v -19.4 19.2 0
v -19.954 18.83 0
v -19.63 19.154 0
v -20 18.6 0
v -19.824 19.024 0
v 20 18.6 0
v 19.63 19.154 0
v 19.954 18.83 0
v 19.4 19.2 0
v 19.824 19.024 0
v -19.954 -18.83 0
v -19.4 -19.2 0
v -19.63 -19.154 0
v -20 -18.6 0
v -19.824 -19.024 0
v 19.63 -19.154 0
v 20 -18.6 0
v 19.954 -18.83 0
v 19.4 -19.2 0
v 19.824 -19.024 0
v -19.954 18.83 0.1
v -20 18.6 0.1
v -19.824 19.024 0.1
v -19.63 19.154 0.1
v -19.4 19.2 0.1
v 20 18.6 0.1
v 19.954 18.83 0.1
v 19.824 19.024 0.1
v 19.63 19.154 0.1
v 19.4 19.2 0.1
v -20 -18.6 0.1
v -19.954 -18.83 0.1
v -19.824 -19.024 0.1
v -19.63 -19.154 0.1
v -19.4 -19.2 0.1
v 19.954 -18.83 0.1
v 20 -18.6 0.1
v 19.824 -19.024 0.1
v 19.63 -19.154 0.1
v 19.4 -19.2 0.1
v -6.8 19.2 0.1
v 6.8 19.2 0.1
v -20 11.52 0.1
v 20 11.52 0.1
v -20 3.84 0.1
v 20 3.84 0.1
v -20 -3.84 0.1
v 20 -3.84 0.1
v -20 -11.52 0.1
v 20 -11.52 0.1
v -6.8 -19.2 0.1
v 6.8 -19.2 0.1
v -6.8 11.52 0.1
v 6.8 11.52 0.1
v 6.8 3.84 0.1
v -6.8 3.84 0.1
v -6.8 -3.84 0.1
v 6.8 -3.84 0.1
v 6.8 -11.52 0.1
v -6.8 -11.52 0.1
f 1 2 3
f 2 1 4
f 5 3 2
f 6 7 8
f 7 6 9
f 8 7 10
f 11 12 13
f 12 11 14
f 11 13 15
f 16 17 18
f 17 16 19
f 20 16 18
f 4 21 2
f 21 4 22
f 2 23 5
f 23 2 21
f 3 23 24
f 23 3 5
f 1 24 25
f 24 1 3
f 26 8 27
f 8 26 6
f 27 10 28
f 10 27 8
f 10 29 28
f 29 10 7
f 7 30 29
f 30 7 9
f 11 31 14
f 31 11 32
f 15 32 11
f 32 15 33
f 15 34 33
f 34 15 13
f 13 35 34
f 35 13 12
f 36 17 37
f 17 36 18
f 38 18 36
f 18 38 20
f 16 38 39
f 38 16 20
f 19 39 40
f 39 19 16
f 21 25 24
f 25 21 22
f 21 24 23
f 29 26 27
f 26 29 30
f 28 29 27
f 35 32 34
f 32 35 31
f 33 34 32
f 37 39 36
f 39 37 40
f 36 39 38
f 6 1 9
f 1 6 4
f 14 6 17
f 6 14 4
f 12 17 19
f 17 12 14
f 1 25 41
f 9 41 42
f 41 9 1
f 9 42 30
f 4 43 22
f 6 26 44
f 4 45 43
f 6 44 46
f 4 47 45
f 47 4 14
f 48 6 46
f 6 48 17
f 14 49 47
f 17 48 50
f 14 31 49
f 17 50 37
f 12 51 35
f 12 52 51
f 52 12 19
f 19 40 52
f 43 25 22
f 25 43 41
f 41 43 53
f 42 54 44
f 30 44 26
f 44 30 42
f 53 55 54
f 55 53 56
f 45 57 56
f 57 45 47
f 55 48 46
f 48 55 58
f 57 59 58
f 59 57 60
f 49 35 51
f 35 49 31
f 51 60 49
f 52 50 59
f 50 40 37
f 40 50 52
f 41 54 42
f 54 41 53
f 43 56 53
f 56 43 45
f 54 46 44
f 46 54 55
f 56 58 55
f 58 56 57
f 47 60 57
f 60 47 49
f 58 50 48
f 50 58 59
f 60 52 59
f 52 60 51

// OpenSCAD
// file: ../p/1-4cyli.scad
use <../lib.scad>
function ldraw_lib__1_4cyli() = [
// 0 Cylinder 0.25
// 0 Name: 1-4cyli.dat
// 0 Author: James Jessiman
// 0 !LDRAW_ORG Primitive UPDATE 2012-01
// 0 !LICENSE Licensed under CC BY 4.0 : see CAreadme.txt
// 
// 0 BFC CERTIFY CCW
  [0,"BFC","CERTIFY"],
  [0,"BFC","CCW"],
// 
// 0 !HISTORY 2002-03-23 [sbliss] Added BFC statement.
// 0 !HISTORY 2002-04-25 [PTadmin] Official Update 2002-02
// 0 !HISTORY 2007-06-22 [PTadmin] Header formatted for Contributor Agreement
// 0 !HISTORY 2008-07-01 [PTadmin] Official Update 2008-01
// 0 !HISTORY 2012-02-16 [Philo] Changed to CCW
// 0 !HISTORY 2012-03-30 [PTadmin] Official Update 2012-01
// 
// 
// 4 16 1 1 0 0.9239 1 0.3827 0.9239 0 0.3827 1 0 0
  [4,16,1,1,0,0.9239,1,0.3827,0.9239,0,0.3827,1,0,0],
// 5 24 1 0 0 1 1 0 0.9239 0 0.3827 1 0 -1
  [5,24,1,0,0,1,1,0,0.9239,0,0.3827,1,0,-1],
// 4 16 0.9239 1 0.3827 0.7071 1 0.7071 0.7071 0 0.7071 0.9239 0 0.3827
  [4,16,0.9239,1,0.3827,0.7071,1,0.7071,0.7071,0,0.7071,0.9239,0,0.3827],
// 5 24 0.9239 0 0.3827 0.9239 1 0.3827 0.7071 0 0.7071 1 0 0
  [5,24,0.9239,0,0.3827,0.9239,1,0.3827,0.7071,0,0.7071,1,0,0],
// 4 16 0.7071 1 0.7071 0.3827 1 0.9239 0.3827 0 0.9239 0.7071 0 0.7071
  [4,16,0.7071,1,0.7071,0.3827,1,0.9239,0.3827,0,0.9239,0.7071,0,0.7071],
// 5 24 0.7071 0 0.7071 0.7071 1 0.7071 0.3827 0 0.9239 0.9239 0 0.3827
  [5,24,0.7071,0,0.7071,0.7071,1,0.7071,0.3827,0,0.9239,0.9239,0,0.3827],
// 4 16 0.3827 1 0.9239 0 1 1 0 0 1 0.3827 0 0.9239
  [4,16,0.3827,1,0.9239,0,1,1,0,0,1,0.3827,0,0.9239],
// 5 24 0.3827 0 0.9239 0.3827 1 0.9239 0 0 1 0.7071 0 0.7071
  [5,24,0.3827,0,0.9239,0.3827,1,0.9239,0,0,1,0.7071,0,0.7071],
// 5 24 0 0 1 0 1 1 0.3827 0 0.9239 -1 0 1
  [5,24,0,0,1,0,1,1,0.3827,0,0.9239,-1,0,1],
];
module ldraw_lib__1_4cyli(step=0, col=false, unit=2/5, alt=false, line=0.2, solid=!$preview)
    makepoly(ldraw_lib__1_4cyli(), step=step, col=col, unit=unit, alt=alt, line=line, solid=solid);
ldraw_lib__1_4cyli(line=0.2);
// file: ../p/1-4chrd.scad
use <../lib.scad>
function ldraw_lib__1_4chrd() = [
// 0 Chord 0.25
// 0 Name: 1-4chrd.dat
// 0 Author: Tony Hafner [hafhead]
// 0 !LDRAW_ORG Primitive UPDATE 2012-02
// 0 !LICENSE Licensed under CC BY 2.0 and CC BY 4.0 : see CAreadme.txt
// 
// 0 BFC CERTIFY CCW
  [0,"BFC","CERTIFY"],
  [0,"BFC","CCW"],
// 
// 0 !HISTORY 2004-04-22 [PTadmin] Official Update 2004-02
// 0 !HISTORY 2007-10-09 [PTadmin] Header formatted for Contributor Agreement
// 0 !HISTORY 2008-07-01 [PTadmin] Official Update 2008-01
// 0 !HISTORY 2012-08-02 [MMR1988] Re-creation with PrimGen2 and Rectifier
// 0 !HISTORY 2012-08-09 [PTadmin] Official Update 2012-02
// 
// 
// 4 16 0.9239 0 0.3827 0.3827 0 0.9239 0 0 1 1 0 0
  [4,16,0.9239,0,0.3827,0.3827,0,0.9239,0,0,1,1,0,0],
// 3 16 0.7071 0 0.7071 0.3827 0 0.9239 0.9239 0 0.3827
  [3,16,0.7071,0,0.7071,0.3827,0,0.9239,0.9239,0,0.3827],
];
module ldraw_lib__1_4chrd(step=0, col=false, unit=2/5, alt=false, line=0.2, solid=!$preview)
    makepoly(ldraw_lib__1_4chrd(), step=step, col=col, unit=unit, alt=alt, line=line, solid=solid);
ldraw_lib__1_4chrd(line=0.2);
// main file
use <../lib.scad>
use <../p/1-4chrd.scad>
use <../p/1-4cyli.scad>
function ldraw_lib__6141875e() = [
// 0 Sticker  4.8 x  5.0 Chequered
// 0 Name: 6141875e.dat
// 0 Author: Massimo Maso [Sirio]
// 0 !LDRAW_ORG Part UPDATE 2022-06
// 0 !LICENSE Licensed under CC BY 4.0 : see CAreadme.txt
// 
// 0 BFC CERTIFY CCW
  [0,"BFC","CERTIFY"],
  [0,"BFC","CCW"],
// 
// 0 !KEYWORDS Bricklink 75875stk01, Brickowl 53567, Rebrickable 24760, Set 75875
// 0 !KEYWORDS Speed Champions
// 
// 0 !HISTORY 2022-12-20 [PTadmin] Official Update 2022-06
// 
// 
// 0 // Primitives
// 
// 1 16 -48.5 0 46.5 -1.5 0 0 0 -1 0 0 0 1.5 1-4chrd.dat
  [1,16,-48.5,0,46.5,-1.5,0,0,0,-1,0,0,0,1.5, ldraw_lib__1_4chrd()],
// 1 16 48.5 0 46.5 1.5 0 0 0 -1 0 0 0 1.5 1-4chrd.dat
  [1,16,48.5,0,46.5,1.5,0,0,0,-1,0,0,0,1.5, ldraw_lib__1_4chrd()],
// 1 16 -48.5 0 -46.5 -1.5 0 0 0 -1 0 0 0 -1.5 1-4chrd.dat
  [1,16,-48.5,0,-46.5,-1.5,0,0,0,-1,0,0,0,-1.5, ldraw_lib__1_4chrd()],
// 1 16 48.5 0 -46.5 1.5 0 0 0 -1 0 0 0 -1.5 1-4chrd.dat
  [1,16,48.5,0,-46.5,1.5,0,0,0,-1,0,0,0,-1.5, ldraw_lib__1_4chrd()],
// 1 16 -48.5 0 46.5 -1.5 0 0 0 -.25 0 0 0 1.5 1-4cyli.dat
  [1,16,-48.5,0,46.5,-1.5,0,0,0,-.25,0,0,0,1.5, ldraw_lib__1_4cyli()],
// 1 16 48.5 0 46.5 1.5 0 0 0 -.25 0 0 0 1.5 1-4cyli.dat
  [1,16,48.5,0,46.5,1.5,0,0,0,-.25,0,0,0,1.5, ldraw_lib__1_4cyli()],
// 1 16 -48.5 0 -46.5 -1.5 0 0 0 -.25 0 0 0 -1.5 1-4cyli.dat
  [1,16,-48.5,0,-46.5,-1.5,0,0,0,-.25,0,0,0,-1.5, ldraw_lib__1_4cyli()],
// 1 16 48.5 0 -46.5 1.5 0 0 0 -.25 0 0 0 -1.5 1-4cyli.dat
  [1,16,48.5,0,-46.5,1.5,0,0,0,-.25,0,0,0,-1.5, ldraw_lib__1_4cyli()],
// 1 0 -48.5 -.25 46.5 -1.5 0 0 0 1 0 0 0 1.5 1-4chrd.dat
  [1,0,-48.5,-.25,46.5,-1.5,0,0,0,1,0,0,0,1.5, ldraw_lib__1_4chrd()],
// 1 0 48.5 -.25 46.5 1.5 0 0 0 1 0 0 0 1.5 1-4chrd.dat
  [1,0,48.5,-.25,46.5,1.5,0,0,0,1,0,0,0,1.5, ldraw_lib__1_4chrd()],
// 1 0 -48.5 -.25 -46.5 -1.5 0 0 0 1 0 0 0 -1.5 1-4chrd.dat
  [1,0,-48.5,-.25,-46.5,-1.5,0,0,0,1,0,0,0,-1.5, ldraw_lib__1_4chrd()],
// 1 0 48.5 -.25 -46.5 1.5 0 0 0 1 0 0 0 -1.5 1-4chrd.dat
  [1,0,48.5,-.25,-46.5,1.5,0,0,0,1,0,0,0,-1.5, ldraw_lib__1_4chrd()],
// 0 // Bottom face
// 4 16 48.5 0 48 50 0 46.5 -50 0 46.5 -48.5 0 48
  [4,16,48.5,0,48,50,0,46.5,-50,0,46.5,-48.5,0,48],
// 4 16 50 0 46.5 50 0 -46.5 -50 0 -46.5 -50 0 46.5
  [4,16,50,0,46.5,50,0,-46.5,-50,0,-46.5,-50,0,46.5],
// 4 16 48.5 0 -48 -48.5 0 -48 -50 0 -46.5 50 0 -46.5
  [4,16,48.5,0,-48,-48.5,0,-48,-50,0,-46.5,50,0,-46.5],
// 0 // Lateral face
// 3 16 -48.5 0 48 -48.5 -.25 48 -17 -.25 48
  [3,16,-48.5,0,48,-48.5,-.25,48,-17,-.25,48],
// 4 16 -48.5 0 48 -17 -.25 48 17 -.25 48 48.5 0 48
  [4,16,-48.5,0,48,-17,-.25,48,17,-.25,48,48.5,0,48],
// 3 16 48.5 0 48 17 -.25 48 48.5 -.25 48
  [3,16,48.5,0,48,17,-.25,48,48.5,-.25,48],
// 3 16 -50 0 46.5 -50 -.25 28.8 -50 -.25 46.5
  [3,16,-50,0,46.5,-50,-.25,28.8,-50,-.25,46.5],
// 3 16 50 0 46.5 50 -.25 46.5 50 -.25 28.8
  [3,16,50,0,46.5,50,-.25,46.5,50,-.25,28.8],
// 3 16 -50 0 46.5 -50 -.25 9.6 -50 -.25 28.8
  [3,16,-50,0,46.5,-50,-.25,9.6,-50,-.25,28.8],
// 3 16 50 0 46.5 50 -.25 28.8 50 -.25 9.6
  [3,16,50,0,46.5,50,-.25,28.8,50,-.25,9.6],
// 4 16 -50 0 46.5 -50 0 -46.5 -50 -.25 -9.6 -50 -.25 9.6
  [4,16,-50,0,46.5,-50,0,-46.5,-50,-.25,-9.6,-50,-.25,9.6],
// 4 16 50 0 46.5 50 -.25 9.6 50 -.25 -9.6 50 0 -46.5
  [4,16,50,0,46.5,50,-.25,9.6,50,-.25,-9.6,50,0,-46.5],
// 3 16 -50 0 -46.5 -50 -.25 -28.8 -50 -.25 -9.6
  [3,16,-50,0,-46.5,-50,-.25,-28.8,-50,-.25,-9.6],
// 3 16 50 0 -46.5 50 -.25 -9.6 50 -.25 -28.8
  [3,16,50,0,-46.5,50,-.25,-9.6,50,-.25,-28.8],
// 3 16 -50 0 -46.5 -50 -.25 -46.5 -50 -.25 -28.8
  [3,16,-50,0,-46.5,-50,-.25,-46.5,-50,-.25,-28.8],
// 3 16 50 0 -46.5 50 -.25 -28.8 50 -.25 -46.5
  [3,16,50,0,-46.5,50,-.25,-28.8,50,-.25,-46.5],
// 3 16 -48.5 0 -48 -17 -.25 -48 -48.5 -.25 -48
  [3,16,-48.5,0,-48,-17,-.25,-48,-48.5,-.25,-48],
// 4 16 -48.5 0 -48 48.5 0 -48 17 -.25 -48 -17 -.25 -48
  [4,16,-48.5,0,-48,48.5,0,-48,17,-.25,-48,-17,-.25,-48],
// 3 16 48.5 0 -48 48.5 -.25 -48 17 -.25 -48
  [3,16,48.5,0,-48,48.5,-.25,-48,17,-.25,-48],
// 0 // Top face
// 0 // Black faces
// 4 0 -17 -.25 48 -48.5 -.25 48 -50 -.25 46.5 -50 -.25 28.8
  [4,0,-17,-.25,48,-48.5,-.25,48,-50,-.25,46.5,-50,-.25,28.8],
// 3 0 -17 -.25 48 -50 -.25 28.8 -17 -.25 28.8
  [3,0,-17,-.25,48,-50,-.25,28.8,-17,-.25,28.8],
// 3 0 17 -.25 48 17 -.25 28.8 50 -.25 28.8
  [3,0,17,-.25,48,17,-.25,28.8,50,-.25,28.8],
// 4 0 17 -.25 48 50 -.25 28.8 50 -.25 46.5 48.5 -.25 48
  [4,0,17,-.25,48,50,-.25,28.8,50,-.25,46.5,48.5,-.25,48],
// 4 0 -17 -.25 28.8 -17 -.25 9.6 17 -.25 9.6 17 -.25 28.8
  [4,0,-17,-.25,28.8,-17,-.25,9.6,17,-.25,9.6,17,-.25,28.8],
// 4 0 -50 -.25 9.6 -50 -.25 -9.6 -17 -.25 -9.6 -17 -.25 9.6
  [4,0,-50,-.25,9.6,-50,-.25,-9.6,-17,-.25,-9.6,-17,-.25,9.6],
// 4 0 17 -.25 9.6 17 -.25 -9.6 50 -.25 -9.6 50 -.25 9.6
  [4,0,17,-.25,9.6,17,-.25,-9.6,50,-.25,-9.6,50,-.25,9.6],
// 4 0 -17 -.25 -9.6 -17 -.25 -28.8 17 -.25 -28.8 17 -.25 -9.6
  [4,0,-17,-.25,-9.6,-17,-.25,-28.8,17,-.25,-28.8,17,-.25,-9.6],
// 4 0 -17 -.25 -48 -50 -.25 -28.8 -50 -.25 -46.5 -48.5 -.25 -48
  [4,0,-17,-.25,-48,-50,-.25,-28.8,-50,-.25,-46.5,-48.5,-.25,-48],
// 3 0 -17 -.25 -48 -17 -.25 -28.8 -50 -.25 -28.8
  [3,0,-17,-.25,-48,-17,-.25,-28.8,-50,-.25,-28.8],
// 3 0 17 -.25 -48 50 -.25 -28.8 17 -.25 -28.8
  [3,0,17,-.25,-48,50,-.25,-28.8,17,-.25,-28.8],
// 4 0 17 -.25 -48 48.5 -.25 -48 50 -.25 -46.5 50 -.25 -28.8
  [4,0,17,-.25,-48,48.5,-.25,-48,50,-.25,-46.5,50,-.25,-28.8],
// 0 // White faces
// 4 15 -17 -.25 48 -17 -.25 28.8 17 -.25 28.8 17 -.25 48
  [4,15,-17,-.25,48,-17,-.25,28.8,17,-.25,28.8,17,-.25,48],
// 4 15 -50 -.25 28.8 -50 -.25 9.6 -17 -.25 9.6 -17 -.25 28.8
  [4,15,-50,-.25,28.8,-50,-.25,9.6,-17,-.25,9.6,-17,-.25,28.8],
// 4 15 17 -.25 28.8 17 -.25 9.6 50 -.25 9.6 50 -.25 28.8
  [4,15,17,-.25,28.8,17,-.25,9.6,50,-.25,9.6,50,-.25,28.8],
// 4 15 -17 -.25 9.6 -17 -.25 -9.6 17 -.25 -9.6 17 -.25 9.6
  [4,15,-17,-.25,9.6,-17,-.25,-9.6,17,-.25,-9.6,17,-.25,9.6],
// 4 15 -50 -.25 -9.6 -50 -.25 -28.8 -17 -.25 -28.8 -17 -.25 -9.6
  [4,15,-50,-.25,-9.6,-50,-.25,-28.8,-17,-.25,-28.8,-17,-.25,-9.6],
// 4 15 17 -.25 -9.6 17 -.25 -28.8 50 -.25 -28.8 50 -.25 -9.6
  [4,15,17,-.25,-9.6,17,-.25,-28.8,50,-.25,-28.8,50,-.25,-9.6],
// 4 15 -17 -.25 -28.8 -17 -.25 -48 17 -.25 -48 17 -.25 -28.8
  [4,15,-17,-.25,-28.8,-17,-.25,-48,17,-.25,-48,17,-.25,-28.8],
];
module ldraw_lib__6141875e(step=0, col=false, unit=2/5, alt=false, line=0.2, solid=!$preview)
    makepoly(ldraw_lib__6141875e(), step=step, col=col, unit=unit, alt=alt, line=line, solid=solid);
ldraw_lib__6141875e(line=0.2);
